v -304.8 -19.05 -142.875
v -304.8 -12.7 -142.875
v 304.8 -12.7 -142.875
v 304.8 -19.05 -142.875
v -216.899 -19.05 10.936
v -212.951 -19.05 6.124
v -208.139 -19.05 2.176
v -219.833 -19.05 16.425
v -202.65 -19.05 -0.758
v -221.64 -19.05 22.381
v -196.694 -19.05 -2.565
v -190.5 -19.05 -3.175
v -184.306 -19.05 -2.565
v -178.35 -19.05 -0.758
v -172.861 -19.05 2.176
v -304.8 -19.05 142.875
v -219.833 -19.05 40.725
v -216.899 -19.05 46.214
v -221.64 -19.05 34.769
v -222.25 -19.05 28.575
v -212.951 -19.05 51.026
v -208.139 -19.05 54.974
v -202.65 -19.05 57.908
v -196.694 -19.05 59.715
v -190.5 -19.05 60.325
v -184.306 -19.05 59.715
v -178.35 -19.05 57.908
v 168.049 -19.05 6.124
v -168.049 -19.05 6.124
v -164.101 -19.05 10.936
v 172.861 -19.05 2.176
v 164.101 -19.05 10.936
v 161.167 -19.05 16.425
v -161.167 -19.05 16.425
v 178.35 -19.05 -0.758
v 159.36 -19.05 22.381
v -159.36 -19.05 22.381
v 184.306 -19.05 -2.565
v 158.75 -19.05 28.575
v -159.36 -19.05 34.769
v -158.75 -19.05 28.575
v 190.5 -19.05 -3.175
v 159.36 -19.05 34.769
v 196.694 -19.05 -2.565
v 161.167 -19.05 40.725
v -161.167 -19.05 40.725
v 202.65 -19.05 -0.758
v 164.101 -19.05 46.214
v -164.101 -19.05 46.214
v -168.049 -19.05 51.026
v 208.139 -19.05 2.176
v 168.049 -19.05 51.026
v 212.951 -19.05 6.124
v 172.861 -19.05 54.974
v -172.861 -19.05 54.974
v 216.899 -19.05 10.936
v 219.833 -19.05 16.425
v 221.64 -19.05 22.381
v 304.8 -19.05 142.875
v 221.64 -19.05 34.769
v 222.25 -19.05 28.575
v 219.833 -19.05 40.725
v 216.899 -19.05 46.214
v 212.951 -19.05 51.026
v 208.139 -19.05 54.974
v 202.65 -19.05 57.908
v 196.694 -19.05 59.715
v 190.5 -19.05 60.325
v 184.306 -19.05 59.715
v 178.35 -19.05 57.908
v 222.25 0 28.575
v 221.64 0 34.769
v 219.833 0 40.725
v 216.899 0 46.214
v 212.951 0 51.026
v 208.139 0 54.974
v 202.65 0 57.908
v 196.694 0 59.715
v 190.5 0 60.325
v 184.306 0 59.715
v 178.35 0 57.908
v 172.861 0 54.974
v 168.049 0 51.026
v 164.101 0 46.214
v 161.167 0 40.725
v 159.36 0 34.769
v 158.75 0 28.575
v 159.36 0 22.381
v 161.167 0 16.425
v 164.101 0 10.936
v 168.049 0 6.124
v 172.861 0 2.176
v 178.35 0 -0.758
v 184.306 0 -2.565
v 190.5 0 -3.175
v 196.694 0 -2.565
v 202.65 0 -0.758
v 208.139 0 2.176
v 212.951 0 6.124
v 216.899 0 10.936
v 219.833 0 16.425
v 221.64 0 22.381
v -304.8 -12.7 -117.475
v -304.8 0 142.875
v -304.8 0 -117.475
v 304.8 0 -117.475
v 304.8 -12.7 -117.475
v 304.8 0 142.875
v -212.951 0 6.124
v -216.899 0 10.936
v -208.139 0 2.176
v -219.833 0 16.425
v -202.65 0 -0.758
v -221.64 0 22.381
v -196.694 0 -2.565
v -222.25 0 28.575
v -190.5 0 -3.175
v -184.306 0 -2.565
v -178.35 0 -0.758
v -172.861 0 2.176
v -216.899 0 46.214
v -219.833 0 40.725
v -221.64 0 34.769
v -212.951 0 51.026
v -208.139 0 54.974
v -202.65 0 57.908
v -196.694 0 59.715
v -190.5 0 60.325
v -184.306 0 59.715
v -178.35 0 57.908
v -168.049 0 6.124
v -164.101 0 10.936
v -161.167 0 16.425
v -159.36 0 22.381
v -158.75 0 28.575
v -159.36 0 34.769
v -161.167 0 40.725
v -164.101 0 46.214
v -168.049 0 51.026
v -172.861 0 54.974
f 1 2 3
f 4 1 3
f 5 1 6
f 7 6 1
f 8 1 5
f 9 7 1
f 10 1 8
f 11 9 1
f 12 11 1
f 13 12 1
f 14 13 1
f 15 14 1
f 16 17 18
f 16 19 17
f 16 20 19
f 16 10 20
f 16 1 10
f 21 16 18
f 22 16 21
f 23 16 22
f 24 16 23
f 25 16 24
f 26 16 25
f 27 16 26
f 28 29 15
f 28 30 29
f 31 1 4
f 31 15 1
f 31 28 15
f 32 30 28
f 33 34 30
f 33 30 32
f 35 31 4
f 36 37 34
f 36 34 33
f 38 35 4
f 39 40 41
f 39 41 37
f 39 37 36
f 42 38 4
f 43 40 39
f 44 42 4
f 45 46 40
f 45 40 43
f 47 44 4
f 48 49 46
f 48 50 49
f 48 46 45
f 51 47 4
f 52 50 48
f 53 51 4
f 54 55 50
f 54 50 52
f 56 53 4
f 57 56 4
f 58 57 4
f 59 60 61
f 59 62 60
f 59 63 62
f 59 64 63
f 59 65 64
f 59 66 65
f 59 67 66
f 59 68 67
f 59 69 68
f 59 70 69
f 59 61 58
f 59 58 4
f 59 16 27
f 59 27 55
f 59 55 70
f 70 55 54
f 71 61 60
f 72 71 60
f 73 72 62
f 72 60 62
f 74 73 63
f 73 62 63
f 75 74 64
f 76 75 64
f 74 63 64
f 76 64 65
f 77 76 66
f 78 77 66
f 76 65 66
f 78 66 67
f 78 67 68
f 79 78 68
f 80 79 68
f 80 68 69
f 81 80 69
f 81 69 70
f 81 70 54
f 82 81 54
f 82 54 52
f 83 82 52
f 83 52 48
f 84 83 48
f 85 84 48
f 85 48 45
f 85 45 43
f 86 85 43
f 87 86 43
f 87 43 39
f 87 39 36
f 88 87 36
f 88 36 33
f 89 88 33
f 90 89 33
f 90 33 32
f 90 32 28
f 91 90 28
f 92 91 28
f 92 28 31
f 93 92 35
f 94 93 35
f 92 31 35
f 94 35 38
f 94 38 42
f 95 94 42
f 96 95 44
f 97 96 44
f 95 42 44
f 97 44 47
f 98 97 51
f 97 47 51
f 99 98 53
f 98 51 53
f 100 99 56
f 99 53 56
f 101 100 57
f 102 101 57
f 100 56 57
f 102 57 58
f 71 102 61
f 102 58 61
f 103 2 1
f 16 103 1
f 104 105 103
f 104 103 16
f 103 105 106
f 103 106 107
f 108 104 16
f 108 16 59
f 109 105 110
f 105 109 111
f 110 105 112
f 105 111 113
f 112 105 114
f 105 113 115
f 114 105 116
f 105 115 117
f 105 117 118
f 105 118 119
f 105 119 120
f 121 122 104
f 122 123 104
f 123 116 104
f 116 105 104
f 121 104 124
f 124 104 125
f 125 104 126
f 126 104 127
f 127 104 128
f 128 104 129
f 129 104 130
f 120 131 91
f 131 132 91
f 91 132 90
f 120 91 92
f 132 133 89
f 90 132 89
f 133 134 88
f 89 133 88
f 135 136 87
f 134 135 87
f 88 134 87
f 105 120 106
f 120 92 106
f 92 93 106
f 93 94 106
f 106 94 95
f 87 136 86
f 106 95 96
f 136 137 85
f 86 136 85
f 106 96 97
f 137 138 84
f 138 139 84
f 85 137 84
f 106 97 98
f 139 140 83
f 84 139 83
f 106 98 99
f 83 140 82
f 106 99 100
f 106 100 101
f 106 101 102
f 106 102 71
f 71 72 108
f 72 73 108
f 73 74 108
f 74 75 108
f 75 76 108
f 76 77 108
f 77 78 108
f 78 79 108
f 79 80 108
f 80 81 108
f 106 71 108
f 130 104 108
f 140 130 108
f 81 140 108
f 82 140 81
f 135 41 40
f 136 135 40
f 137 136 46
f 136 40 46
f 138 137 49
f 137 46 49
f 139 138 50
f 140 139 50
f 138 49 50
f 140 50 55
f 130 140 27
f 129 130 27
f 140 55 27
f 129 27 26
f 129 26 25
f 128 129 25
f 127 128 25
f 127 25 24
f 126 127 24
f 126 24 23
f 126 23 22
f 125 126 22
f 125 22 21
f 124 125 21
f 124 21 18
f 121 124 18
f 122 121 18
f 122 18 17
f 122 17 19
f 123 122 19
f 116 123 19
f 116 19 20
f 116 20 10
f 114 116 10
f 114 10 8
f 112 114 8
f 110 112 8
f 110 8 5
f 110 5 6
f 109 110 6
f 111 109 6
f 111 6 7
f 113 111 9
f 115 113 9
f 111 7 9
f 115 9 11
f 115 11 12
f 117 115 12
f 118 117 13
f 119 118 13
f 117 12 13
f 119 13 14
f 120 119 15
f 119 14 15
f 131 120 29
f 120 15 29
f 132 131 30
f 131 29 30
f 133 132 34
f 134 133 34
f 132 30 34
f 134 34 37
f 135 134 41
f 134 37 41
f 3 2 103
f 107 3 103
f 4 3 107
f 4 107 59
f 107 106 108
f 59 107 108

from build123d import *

# Parameters (mm, degrees)
F0_W     = 609.6
F0_H     = 285.75
F1_DEPTH = 19.05
F2_W     = 12.7
F2_H     = 25.4
F3_DEPTH = 609.601
F4_R     = 31.75
F5_DEPTH = 19.051


with BuildPart() as f1:
    # F0 (on Front) → F1 (new body)
    with BuildSketch(Plane.XZ):
        Rectangle(F0_W, F0_H)
    extrude(amount=F1_DEPTH)

    # F2 (on face) → F3 (cut, through all)
    with BuildSketch(Plane(origin=(-304.8, 0, 0), x_dir=(0, -1, 0), z_dir=(-1, 0, 0))):
        with Locations((6.35, -130.175)):
            Rectangle(F2_W, F2_H)
    extrude(amount=-F3_DEPTH, mode=Mode.SUBTRACT)

    # F4 (on face) → F5 (cut, through all)
    with BuildSketch(Plane.XZ.offset(19.05)):
        with Locations((-190.5, 28.575)):
            Circle(F4_R)
        with Locations((190.5, 28.575)):
            Circle(F4_R)
    extrude(amount=-F5_DEPTH, mode=Mode.SUBTRACT)


solid = f1.part
